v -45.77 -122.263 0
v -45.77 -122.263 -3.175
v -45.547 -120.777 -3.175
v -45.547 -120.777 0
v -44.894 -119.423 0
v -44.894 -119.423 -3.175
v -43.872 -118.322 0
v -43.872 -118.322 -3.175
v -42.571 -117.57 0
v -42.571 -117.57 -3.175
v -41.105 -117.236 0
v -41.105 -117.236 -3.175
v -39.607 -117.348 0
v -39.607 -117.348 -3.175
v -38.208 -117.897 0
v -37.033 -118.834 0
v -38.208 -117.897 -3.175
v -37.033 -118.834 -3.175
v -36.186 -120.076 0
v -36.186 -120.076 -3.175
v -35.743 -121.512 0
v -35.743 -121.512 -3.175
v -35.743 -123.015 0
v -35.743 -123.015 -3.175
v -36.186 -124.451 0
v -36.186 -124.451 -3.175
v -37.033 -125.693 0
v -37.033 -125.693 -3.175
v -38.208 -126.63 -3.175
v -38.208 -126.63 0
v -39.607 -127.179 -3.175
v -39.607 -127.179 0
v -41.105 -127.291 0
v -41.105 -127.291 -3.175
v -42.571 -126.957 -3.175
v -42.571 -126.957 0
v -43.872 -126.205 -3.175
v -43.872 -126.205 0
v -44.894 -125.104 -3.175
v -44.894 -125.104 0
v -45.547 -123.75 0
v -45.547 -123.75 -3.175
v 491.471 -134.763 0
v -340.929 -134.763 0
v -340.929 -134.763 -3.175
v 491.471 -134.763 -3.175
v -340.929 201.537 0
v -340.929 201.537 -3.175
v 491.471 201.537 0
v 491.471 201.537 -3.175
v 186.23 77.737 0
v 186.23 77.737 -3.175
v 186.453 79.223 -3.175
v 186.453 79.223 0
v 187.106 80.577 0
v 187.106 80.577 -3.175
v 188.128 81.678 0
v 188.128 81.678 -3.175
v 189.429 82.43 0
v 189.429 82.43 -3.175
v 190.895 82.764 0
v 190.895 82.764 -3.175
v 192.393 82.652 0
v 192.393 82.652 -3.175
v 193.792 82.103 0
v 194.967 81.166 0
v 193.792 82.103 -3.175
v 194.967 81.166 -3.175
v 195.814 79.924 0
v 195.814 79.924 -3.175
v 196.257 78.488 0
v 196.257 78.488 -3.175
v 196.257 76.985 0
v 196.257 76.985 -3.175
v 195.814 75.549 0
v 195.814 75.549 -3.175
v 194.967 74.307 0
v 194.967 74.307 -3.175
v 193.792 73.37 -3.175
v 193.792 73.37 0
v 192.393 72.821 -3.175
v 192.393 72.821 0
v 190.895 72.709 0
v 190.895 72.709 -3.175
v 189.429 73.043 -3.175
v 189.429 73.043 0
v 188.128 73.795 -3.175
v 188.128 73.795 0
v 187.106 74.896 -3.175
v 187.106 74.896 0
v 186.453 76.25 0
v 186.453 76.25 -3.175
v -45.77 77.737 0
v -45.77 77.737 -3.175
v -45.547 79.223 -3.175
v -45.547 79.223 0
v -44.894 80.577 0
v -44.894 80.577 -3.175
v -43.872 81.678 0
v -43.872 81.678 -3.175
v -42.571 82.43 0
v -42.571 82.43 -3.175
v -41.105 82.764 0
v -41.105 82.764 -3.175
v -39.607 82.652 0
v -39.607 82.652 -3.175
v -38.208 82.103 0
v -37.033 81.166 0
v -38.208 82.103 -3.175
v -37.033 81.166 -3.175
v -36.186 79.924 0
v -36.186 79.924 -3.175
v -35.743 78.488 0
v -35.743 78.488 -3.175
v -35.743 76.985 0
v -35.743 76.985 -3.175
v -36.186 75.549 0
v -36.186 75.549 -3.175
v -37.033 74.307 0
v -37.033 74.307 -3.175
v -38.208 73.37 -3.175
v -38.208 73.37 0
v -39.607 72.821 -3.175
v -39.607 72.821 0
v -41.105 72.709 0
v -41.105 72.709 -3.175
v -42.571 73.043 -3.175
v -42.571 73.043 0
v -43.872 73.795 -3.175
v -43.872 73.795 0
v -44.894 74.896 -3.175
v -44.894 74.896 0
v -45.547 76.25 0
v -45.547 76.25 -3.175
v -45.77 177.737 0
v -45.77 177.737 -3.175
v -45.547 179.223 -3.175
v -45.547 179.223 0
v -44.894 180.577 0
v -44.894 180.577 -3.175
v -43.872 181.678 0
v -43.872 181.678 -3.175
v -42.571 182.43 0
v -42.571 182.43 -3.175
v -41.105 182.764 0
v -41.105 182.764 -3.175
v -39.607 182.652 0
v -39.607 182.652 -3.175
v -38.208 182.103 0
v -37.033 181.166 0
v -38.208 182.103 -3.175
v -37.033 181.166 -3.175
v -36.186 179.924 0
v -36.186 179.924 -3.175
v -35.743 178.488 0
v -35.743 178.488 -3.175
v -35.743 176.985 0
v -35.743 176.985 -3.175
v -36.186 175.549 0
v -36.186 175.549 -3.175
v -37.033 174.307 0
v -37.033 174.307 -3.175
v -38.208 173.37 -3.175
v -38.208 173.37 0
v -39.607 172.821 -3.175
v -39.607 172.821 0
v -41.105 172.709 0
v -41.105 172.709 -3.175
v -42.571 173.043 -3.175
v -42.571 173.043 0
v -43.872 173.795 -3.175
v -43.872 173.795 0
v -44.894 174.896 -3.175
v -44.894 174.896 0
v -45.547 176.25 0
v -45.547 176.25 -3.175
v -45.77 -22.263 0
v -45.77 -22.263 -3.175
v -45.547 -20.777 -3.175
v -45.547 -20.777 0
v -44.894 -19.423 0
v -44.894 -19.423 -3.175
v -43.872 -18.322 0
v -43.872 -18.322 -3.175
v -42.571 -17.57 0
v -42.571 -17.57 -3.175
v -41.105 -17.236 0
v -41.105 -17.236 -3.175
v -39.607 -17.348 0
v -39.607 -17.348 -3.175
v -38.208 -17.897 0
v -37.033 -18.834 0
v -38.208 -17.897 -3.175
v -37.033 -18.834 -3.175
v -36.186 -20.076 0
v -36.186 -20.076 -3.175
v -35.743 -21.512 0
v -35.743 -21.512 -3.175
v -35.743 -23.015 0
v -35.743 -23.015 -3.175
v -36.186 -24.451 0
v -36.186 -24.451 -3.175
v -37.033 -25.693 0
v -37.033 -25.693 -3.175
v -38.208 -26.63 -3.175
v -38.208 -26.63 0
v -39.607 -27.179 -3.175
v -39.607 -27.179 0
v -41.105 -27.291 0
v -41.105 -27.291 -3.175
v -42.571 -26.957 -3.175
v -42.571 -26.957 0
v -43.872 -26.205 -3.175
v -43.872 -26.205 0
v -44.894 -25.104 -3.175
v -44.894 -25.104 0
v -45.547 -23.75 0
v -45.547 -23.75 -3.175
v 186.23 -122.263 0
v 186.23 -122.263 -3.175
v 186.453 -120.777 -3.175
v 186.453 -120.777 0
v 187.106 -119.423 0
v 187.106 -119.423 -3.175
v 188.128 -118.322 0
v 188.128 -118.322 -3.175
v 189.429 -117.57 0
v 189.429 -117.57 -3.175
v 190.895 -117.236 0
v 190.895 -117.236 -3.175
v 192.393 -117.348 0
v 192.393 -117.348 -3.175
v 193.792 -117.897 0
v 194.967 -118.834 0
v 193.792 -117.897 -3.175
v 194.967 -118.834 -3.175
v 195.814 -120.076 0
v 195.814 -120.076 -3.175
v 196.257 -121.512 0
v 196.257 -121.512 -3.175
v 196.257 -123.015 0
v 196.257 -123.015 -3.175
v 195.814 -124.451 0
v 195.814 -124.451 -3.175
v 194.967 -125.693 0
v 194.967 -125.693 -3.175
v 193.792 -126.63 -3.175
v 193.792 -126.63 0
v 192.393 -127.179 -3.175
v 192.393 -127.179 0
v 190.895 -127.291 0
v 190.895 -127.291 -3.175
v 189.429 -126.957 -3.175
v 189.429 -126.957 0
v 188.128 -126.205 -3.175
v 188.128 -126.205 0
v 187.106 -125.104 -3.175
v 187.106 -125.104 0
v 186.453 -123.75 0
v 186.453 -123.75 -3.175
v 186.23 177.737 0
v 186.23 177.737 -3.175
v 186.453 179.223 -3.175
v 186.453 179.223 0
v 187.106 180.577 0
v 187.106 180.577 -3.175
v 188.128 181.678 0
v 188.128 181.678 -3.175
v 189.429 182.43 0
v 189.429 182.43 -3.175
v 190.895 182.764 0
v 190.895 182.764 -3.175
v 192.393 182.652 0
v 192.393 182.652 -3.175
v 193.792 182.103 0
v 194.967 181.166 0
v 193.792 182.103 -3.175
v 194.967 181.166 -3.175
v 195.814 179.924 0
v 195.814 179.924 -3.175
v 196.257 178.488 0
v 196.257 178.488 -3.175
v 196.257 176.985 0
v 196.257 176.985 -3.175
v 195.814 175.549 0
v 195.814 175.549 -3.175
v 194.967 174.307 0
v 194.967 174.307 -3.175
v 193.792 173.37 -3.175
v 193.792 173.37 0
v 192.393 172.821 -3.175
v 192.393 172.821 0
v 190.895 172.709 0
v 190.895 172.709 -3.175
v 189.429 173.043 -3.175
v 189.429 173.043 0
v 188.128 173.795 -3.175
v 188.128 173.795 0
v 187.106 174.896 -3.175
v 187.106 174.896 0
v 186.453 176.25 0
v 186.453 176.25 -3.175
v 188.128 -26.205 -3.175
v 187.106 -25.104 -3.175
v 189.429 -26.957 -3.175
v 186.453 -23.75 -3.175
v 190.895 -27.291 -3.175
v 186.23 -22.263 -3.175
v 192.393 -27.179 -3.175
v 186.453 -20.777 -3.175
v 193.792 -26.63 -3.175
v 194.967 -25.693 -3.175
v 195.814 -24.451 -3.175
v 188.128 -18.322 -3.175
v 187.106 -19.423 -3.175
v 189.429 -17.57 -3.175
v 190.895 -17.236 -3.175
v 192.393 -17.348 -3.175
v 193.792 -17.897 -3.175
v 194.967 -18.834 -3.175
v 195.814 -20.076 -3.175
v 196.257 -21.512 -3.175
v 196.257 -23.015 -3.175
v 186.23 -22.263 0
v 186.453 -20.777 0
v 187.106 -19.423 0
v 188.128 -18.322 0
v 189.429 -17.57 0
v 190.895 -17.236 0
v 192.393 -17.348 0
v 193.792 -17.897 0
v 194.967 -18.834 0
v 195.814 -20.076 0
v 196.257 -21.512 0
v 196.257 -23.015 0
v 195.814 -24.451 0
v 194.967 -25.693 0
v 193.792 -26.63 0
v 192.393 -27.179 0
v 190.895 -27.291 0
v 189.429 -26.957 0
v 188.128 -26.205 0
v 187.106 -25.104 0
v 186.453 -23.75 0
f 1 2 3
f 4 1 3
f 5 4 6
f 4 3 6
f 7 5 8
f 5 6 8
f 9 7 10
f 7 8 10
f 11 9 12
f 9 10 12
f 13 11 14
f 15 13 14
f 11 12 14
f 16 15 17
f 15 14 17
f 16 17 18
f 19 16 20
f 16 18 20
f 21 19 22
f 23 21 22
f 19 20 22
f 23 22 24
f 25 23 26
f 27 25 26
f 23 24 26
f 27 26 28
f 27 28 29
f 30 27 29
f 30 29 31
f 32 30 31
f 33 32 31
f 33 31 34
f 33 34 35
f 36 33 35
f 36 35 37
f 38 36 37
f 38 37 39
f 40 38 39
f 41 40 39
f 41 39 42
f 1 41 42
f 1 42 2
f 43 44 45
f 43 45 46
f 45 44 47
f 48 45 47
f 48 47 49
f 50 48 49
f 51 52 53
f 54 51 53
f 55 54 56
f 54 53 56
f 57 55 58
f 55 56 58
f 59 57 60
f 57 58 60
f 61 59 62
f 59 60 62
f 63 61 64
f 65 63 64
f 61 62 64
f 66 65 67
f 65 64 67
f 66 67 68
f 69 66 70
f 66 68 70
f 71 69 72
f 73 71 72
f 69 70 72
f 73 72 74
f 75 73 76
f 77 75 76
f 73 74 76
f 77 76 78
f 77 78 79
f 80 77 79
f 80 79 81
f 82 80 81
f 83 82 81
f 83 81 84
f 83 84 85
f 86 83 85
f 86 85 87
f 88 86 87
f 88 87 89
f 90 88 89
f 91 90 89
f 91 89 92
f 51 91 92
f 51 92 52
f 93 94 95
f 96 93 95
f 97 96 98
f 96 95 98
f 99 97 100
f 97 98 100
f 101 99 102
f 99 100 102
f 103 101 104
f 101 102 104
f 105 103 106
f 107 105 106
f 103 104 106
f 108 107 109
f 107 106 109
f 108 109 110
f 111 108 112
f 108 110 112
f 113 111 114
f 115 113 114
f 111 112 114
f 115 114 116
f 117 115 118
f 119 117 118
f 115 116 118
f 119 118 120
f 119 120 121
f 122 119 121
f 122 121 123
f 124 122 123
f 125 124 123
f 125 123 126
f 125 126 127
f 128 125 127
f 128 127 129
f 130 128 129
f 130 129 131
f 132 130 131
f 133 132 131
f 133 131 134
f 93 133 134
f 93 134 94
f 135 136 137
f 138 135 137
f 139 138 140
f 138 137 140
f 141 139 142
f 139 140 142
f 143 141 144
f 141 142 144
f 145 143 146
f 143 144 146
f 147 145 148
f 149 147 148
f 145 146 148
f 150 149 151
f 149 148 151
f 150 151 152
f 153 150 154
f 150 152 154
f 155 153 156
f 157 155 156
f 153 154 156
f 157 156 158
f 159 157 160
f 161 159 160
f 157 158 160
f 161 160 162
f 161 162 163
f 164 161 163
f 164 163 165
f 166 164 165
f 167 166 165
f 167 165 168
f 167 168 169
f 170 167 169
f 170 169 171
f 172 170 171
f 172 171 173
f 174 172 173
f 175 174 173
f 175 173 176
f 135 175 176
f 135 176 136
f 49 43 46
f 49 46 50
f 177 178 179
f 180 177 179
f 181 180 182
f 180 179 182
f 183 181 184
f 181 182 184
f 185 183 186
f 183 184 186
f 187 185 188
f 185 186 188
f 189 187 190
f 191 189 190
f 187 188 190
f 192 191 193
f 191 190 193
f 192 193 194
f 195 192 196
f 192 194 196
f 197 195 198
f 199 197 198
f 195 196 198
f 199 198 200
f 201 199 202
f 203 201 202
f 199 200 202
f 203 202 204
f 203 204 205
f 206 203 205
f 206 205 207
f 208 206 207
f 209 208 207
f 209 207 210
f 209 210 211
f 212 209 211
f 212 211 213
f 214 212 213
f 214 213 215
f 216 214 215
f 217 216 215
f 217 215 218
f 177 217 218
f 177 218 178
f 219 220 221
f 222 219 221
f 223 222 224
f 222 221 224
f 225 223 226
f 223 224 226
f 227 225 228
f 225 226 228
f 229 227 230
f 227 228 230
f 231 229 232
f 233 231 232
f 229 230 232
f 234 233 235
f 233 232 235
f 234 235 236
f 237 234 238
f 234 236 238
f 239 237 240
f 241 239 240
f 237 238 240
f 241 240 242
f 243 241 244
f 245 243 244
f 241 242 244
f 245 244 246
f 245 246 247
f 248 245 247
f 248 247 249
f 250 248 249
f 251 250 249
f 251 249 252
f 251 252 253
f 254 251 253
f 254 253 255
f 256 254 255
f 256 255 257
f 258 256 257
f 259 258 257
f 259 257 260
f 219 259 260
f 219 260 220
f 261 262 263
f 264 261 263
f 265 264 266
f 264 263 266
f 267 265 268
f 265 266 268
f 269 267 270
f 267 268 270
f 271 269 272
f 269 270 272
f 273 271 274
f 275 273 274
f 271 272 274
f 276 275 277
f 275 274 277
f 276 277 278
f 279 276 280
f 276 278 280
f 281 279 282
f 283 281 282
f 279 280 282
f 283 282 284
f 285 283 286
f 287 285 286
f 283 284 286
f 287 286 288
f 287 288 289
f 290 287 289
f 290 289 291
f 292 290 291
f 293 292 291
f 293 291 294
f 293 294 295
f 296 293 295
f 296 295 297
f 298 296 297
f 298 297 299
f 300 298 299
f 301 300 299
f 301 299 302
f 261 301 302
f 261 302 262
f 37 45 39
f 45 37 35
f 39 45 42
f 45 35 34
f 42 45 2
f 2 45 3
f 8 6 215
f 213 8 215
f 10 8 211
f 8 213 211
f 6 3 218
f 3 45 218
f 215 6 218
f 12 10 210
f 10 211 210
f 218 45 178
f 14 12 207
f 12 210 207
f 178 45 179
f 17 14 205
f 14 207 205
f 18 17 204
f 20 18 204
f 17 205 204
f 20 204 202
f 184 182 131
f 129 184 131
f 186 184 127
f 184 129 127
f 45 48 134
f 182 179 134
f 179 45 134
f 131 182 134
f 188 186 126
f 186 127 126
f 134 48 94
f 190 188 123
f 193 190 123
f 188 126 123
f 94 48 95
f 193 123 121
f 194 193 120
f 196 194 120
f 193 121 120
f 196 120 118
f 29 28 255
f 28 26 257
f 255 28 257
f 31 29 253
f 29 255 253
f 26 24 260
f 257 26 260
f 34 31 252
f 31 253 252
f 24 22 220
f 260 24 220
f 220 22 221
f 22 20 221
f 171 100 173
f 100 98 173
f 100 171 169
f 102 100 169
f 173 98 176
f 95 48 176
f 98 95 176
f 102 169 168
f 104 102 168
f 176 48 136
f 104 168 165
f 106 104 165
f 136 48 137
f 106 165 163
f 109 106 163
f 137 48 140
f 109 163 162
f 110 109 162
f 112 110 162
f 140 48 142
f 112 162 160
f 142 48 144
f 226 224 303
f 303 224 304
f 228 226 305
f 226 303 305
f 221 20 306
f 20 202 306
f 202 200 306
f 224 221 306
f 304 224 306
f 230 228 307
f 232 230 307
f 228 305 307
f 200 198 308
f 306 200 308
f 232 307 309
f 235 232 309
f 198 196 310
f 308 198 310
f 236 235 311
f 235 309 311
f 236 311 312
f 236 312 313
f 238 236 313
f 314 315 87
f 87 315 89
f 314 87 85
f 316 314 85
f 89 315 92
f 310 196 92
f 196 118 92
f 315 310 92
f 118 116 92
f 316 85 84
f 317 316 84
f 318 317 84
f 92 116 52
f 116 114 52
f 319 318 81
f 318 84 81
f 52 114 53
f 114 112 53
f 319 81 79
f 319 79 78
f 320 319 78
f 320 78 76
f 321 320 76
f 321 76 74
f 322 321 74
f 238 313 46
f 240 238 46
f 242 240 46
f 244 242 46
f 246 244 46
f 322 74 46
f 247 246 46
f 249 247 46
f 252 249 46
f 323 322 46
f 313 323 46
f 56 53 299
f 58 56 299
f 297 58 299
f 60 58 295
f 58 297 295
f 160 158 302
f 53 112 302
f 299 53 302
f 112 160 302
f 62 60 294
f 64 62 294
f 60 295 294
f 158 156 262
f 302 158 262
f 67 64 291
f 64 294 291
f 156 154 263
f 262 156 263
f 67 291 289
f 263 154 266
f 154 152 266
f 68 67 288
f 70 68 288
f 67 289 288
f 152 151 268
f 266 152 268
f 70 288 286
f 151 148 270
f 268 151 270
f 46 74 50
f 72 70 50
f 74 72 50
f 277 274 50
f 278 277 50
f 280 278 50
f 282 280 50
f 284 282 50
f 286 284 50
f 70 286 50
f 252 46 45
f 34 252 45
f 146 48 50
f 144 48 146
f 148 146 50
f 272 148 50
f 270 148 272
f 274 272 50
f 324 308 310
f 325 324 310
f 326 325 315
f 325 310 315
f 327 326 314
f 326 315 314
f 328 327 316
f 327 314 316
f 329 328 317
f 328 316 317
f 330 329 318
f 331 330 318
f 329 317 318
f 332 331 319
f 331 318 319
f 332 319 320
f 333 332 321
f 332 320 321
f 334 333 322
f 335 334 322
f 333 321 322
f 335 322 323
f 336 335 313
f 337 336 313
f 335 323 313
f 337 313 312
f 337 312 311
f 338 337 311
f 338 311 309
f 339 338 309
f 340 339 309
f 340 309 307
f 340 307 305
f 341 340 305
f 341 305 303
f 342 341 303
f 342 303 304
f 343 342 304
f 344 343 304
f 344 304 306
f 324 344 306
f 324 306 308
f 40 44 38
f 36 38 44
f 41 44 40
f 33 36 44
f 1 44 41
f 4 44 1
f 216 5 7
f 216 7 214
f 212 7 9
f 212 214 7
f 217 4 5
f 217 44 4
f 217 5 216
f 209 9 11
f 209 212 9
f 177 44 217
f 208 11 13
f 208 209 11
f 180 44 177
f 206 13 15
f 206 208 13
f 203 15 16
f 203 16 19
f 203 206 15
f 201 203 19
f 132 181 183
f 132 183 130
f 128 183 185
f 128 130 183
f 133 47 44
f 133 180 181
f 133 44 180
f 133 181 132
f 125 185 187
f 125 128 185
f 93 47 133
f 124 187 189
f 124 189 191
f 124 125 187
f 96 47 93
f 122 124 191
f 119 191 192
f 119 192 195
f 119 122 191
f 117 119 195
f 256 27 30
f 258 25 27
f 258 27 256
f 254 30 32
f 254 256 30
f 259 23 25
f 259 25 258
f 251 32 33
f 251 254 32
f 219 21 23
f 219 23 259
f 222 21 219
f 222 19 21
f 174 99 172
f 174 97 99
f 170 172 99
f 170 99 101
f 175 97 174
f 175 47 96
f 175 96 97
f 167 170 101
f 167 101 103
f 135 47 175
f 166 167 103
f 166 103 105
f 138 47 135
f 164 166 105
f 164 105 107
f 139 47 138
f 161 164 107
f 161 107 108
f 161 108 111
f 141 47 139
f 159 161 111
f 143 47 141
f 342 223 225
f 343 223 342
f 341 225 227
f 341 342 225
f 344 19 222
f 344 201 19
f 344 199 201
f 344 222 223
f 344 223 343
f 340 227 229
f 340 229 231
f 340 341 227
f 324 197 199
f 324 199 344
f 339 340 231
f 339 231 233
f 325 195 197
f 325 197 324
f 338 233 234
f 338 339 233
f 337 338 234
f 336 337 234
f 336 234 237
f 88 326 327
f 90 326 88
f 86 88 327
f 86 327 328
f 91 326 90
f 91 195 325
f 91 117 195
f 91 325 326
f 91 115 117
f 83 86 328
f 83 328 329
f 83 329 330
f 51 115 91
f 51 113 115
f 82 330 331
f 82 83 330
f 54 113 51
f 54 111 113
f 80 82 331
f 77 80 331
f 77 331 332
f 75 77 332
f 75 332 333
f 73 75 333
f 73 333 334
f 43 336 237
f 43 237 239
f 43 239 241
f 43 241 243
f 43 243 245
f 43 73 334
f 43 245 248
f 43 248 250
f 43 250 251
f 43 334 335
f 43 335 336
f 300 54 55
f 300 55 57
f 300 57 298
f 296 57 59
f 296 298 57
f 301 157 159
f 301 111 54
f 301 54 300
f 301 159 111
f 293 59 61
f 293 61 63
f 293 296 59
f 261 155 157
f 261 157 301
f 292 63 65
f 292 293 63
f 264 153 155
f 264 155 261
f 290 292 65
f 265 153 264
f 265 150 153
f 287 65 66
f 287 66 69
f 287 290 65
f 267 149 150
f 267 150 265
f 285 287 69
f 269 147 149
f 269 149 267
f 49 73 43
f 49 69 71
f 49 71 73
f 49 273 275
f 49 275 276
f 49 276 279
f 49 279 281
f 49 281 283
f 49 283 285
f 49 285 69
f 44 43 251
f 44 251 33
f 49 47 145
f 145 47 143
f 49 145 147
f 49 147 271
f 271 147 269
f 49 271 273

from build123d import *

# Parameters (mm, degrees)
CROQUIS1_W                    = 832.4
CROQUIS1_H                    = 336.3
BRIDA_BASE1_DEPTH             = 3.175
TALADRO_DE_MARGEN_PARA_3_81_D = 10.0838


# Sheet-metal steps are written as plain solids
with BuildPart() as part:
    # Croquis1 → Brida base1 (new body)
    with BuildSketch(Plane.XY):
        with Locations((75.271401719, 33.386549165)):
            Rectangle(CROQUIS1_W, CROQUIS1_H)
    extrude(amount=-BRIDA_BASE1_DEPTH)

    # Taladro de margen para 3/81 (through all)
    with Locations(Plane.XY):
        with Locations((-40.728598281, 77.736549165), (-40.728598281, -22.263450835), (191.271401719, 77.736549165), (191.271401719, -22.263450835), (-40.728598281, -122.263450835), (191.271401719, -122.263450835), (191.271401719, 177.736549165), (-40.728598281, 177.736549165)):
            Hole(TALADRO_DE_MARGEN_PARA_3_81_D / 2)


solid = part.part
